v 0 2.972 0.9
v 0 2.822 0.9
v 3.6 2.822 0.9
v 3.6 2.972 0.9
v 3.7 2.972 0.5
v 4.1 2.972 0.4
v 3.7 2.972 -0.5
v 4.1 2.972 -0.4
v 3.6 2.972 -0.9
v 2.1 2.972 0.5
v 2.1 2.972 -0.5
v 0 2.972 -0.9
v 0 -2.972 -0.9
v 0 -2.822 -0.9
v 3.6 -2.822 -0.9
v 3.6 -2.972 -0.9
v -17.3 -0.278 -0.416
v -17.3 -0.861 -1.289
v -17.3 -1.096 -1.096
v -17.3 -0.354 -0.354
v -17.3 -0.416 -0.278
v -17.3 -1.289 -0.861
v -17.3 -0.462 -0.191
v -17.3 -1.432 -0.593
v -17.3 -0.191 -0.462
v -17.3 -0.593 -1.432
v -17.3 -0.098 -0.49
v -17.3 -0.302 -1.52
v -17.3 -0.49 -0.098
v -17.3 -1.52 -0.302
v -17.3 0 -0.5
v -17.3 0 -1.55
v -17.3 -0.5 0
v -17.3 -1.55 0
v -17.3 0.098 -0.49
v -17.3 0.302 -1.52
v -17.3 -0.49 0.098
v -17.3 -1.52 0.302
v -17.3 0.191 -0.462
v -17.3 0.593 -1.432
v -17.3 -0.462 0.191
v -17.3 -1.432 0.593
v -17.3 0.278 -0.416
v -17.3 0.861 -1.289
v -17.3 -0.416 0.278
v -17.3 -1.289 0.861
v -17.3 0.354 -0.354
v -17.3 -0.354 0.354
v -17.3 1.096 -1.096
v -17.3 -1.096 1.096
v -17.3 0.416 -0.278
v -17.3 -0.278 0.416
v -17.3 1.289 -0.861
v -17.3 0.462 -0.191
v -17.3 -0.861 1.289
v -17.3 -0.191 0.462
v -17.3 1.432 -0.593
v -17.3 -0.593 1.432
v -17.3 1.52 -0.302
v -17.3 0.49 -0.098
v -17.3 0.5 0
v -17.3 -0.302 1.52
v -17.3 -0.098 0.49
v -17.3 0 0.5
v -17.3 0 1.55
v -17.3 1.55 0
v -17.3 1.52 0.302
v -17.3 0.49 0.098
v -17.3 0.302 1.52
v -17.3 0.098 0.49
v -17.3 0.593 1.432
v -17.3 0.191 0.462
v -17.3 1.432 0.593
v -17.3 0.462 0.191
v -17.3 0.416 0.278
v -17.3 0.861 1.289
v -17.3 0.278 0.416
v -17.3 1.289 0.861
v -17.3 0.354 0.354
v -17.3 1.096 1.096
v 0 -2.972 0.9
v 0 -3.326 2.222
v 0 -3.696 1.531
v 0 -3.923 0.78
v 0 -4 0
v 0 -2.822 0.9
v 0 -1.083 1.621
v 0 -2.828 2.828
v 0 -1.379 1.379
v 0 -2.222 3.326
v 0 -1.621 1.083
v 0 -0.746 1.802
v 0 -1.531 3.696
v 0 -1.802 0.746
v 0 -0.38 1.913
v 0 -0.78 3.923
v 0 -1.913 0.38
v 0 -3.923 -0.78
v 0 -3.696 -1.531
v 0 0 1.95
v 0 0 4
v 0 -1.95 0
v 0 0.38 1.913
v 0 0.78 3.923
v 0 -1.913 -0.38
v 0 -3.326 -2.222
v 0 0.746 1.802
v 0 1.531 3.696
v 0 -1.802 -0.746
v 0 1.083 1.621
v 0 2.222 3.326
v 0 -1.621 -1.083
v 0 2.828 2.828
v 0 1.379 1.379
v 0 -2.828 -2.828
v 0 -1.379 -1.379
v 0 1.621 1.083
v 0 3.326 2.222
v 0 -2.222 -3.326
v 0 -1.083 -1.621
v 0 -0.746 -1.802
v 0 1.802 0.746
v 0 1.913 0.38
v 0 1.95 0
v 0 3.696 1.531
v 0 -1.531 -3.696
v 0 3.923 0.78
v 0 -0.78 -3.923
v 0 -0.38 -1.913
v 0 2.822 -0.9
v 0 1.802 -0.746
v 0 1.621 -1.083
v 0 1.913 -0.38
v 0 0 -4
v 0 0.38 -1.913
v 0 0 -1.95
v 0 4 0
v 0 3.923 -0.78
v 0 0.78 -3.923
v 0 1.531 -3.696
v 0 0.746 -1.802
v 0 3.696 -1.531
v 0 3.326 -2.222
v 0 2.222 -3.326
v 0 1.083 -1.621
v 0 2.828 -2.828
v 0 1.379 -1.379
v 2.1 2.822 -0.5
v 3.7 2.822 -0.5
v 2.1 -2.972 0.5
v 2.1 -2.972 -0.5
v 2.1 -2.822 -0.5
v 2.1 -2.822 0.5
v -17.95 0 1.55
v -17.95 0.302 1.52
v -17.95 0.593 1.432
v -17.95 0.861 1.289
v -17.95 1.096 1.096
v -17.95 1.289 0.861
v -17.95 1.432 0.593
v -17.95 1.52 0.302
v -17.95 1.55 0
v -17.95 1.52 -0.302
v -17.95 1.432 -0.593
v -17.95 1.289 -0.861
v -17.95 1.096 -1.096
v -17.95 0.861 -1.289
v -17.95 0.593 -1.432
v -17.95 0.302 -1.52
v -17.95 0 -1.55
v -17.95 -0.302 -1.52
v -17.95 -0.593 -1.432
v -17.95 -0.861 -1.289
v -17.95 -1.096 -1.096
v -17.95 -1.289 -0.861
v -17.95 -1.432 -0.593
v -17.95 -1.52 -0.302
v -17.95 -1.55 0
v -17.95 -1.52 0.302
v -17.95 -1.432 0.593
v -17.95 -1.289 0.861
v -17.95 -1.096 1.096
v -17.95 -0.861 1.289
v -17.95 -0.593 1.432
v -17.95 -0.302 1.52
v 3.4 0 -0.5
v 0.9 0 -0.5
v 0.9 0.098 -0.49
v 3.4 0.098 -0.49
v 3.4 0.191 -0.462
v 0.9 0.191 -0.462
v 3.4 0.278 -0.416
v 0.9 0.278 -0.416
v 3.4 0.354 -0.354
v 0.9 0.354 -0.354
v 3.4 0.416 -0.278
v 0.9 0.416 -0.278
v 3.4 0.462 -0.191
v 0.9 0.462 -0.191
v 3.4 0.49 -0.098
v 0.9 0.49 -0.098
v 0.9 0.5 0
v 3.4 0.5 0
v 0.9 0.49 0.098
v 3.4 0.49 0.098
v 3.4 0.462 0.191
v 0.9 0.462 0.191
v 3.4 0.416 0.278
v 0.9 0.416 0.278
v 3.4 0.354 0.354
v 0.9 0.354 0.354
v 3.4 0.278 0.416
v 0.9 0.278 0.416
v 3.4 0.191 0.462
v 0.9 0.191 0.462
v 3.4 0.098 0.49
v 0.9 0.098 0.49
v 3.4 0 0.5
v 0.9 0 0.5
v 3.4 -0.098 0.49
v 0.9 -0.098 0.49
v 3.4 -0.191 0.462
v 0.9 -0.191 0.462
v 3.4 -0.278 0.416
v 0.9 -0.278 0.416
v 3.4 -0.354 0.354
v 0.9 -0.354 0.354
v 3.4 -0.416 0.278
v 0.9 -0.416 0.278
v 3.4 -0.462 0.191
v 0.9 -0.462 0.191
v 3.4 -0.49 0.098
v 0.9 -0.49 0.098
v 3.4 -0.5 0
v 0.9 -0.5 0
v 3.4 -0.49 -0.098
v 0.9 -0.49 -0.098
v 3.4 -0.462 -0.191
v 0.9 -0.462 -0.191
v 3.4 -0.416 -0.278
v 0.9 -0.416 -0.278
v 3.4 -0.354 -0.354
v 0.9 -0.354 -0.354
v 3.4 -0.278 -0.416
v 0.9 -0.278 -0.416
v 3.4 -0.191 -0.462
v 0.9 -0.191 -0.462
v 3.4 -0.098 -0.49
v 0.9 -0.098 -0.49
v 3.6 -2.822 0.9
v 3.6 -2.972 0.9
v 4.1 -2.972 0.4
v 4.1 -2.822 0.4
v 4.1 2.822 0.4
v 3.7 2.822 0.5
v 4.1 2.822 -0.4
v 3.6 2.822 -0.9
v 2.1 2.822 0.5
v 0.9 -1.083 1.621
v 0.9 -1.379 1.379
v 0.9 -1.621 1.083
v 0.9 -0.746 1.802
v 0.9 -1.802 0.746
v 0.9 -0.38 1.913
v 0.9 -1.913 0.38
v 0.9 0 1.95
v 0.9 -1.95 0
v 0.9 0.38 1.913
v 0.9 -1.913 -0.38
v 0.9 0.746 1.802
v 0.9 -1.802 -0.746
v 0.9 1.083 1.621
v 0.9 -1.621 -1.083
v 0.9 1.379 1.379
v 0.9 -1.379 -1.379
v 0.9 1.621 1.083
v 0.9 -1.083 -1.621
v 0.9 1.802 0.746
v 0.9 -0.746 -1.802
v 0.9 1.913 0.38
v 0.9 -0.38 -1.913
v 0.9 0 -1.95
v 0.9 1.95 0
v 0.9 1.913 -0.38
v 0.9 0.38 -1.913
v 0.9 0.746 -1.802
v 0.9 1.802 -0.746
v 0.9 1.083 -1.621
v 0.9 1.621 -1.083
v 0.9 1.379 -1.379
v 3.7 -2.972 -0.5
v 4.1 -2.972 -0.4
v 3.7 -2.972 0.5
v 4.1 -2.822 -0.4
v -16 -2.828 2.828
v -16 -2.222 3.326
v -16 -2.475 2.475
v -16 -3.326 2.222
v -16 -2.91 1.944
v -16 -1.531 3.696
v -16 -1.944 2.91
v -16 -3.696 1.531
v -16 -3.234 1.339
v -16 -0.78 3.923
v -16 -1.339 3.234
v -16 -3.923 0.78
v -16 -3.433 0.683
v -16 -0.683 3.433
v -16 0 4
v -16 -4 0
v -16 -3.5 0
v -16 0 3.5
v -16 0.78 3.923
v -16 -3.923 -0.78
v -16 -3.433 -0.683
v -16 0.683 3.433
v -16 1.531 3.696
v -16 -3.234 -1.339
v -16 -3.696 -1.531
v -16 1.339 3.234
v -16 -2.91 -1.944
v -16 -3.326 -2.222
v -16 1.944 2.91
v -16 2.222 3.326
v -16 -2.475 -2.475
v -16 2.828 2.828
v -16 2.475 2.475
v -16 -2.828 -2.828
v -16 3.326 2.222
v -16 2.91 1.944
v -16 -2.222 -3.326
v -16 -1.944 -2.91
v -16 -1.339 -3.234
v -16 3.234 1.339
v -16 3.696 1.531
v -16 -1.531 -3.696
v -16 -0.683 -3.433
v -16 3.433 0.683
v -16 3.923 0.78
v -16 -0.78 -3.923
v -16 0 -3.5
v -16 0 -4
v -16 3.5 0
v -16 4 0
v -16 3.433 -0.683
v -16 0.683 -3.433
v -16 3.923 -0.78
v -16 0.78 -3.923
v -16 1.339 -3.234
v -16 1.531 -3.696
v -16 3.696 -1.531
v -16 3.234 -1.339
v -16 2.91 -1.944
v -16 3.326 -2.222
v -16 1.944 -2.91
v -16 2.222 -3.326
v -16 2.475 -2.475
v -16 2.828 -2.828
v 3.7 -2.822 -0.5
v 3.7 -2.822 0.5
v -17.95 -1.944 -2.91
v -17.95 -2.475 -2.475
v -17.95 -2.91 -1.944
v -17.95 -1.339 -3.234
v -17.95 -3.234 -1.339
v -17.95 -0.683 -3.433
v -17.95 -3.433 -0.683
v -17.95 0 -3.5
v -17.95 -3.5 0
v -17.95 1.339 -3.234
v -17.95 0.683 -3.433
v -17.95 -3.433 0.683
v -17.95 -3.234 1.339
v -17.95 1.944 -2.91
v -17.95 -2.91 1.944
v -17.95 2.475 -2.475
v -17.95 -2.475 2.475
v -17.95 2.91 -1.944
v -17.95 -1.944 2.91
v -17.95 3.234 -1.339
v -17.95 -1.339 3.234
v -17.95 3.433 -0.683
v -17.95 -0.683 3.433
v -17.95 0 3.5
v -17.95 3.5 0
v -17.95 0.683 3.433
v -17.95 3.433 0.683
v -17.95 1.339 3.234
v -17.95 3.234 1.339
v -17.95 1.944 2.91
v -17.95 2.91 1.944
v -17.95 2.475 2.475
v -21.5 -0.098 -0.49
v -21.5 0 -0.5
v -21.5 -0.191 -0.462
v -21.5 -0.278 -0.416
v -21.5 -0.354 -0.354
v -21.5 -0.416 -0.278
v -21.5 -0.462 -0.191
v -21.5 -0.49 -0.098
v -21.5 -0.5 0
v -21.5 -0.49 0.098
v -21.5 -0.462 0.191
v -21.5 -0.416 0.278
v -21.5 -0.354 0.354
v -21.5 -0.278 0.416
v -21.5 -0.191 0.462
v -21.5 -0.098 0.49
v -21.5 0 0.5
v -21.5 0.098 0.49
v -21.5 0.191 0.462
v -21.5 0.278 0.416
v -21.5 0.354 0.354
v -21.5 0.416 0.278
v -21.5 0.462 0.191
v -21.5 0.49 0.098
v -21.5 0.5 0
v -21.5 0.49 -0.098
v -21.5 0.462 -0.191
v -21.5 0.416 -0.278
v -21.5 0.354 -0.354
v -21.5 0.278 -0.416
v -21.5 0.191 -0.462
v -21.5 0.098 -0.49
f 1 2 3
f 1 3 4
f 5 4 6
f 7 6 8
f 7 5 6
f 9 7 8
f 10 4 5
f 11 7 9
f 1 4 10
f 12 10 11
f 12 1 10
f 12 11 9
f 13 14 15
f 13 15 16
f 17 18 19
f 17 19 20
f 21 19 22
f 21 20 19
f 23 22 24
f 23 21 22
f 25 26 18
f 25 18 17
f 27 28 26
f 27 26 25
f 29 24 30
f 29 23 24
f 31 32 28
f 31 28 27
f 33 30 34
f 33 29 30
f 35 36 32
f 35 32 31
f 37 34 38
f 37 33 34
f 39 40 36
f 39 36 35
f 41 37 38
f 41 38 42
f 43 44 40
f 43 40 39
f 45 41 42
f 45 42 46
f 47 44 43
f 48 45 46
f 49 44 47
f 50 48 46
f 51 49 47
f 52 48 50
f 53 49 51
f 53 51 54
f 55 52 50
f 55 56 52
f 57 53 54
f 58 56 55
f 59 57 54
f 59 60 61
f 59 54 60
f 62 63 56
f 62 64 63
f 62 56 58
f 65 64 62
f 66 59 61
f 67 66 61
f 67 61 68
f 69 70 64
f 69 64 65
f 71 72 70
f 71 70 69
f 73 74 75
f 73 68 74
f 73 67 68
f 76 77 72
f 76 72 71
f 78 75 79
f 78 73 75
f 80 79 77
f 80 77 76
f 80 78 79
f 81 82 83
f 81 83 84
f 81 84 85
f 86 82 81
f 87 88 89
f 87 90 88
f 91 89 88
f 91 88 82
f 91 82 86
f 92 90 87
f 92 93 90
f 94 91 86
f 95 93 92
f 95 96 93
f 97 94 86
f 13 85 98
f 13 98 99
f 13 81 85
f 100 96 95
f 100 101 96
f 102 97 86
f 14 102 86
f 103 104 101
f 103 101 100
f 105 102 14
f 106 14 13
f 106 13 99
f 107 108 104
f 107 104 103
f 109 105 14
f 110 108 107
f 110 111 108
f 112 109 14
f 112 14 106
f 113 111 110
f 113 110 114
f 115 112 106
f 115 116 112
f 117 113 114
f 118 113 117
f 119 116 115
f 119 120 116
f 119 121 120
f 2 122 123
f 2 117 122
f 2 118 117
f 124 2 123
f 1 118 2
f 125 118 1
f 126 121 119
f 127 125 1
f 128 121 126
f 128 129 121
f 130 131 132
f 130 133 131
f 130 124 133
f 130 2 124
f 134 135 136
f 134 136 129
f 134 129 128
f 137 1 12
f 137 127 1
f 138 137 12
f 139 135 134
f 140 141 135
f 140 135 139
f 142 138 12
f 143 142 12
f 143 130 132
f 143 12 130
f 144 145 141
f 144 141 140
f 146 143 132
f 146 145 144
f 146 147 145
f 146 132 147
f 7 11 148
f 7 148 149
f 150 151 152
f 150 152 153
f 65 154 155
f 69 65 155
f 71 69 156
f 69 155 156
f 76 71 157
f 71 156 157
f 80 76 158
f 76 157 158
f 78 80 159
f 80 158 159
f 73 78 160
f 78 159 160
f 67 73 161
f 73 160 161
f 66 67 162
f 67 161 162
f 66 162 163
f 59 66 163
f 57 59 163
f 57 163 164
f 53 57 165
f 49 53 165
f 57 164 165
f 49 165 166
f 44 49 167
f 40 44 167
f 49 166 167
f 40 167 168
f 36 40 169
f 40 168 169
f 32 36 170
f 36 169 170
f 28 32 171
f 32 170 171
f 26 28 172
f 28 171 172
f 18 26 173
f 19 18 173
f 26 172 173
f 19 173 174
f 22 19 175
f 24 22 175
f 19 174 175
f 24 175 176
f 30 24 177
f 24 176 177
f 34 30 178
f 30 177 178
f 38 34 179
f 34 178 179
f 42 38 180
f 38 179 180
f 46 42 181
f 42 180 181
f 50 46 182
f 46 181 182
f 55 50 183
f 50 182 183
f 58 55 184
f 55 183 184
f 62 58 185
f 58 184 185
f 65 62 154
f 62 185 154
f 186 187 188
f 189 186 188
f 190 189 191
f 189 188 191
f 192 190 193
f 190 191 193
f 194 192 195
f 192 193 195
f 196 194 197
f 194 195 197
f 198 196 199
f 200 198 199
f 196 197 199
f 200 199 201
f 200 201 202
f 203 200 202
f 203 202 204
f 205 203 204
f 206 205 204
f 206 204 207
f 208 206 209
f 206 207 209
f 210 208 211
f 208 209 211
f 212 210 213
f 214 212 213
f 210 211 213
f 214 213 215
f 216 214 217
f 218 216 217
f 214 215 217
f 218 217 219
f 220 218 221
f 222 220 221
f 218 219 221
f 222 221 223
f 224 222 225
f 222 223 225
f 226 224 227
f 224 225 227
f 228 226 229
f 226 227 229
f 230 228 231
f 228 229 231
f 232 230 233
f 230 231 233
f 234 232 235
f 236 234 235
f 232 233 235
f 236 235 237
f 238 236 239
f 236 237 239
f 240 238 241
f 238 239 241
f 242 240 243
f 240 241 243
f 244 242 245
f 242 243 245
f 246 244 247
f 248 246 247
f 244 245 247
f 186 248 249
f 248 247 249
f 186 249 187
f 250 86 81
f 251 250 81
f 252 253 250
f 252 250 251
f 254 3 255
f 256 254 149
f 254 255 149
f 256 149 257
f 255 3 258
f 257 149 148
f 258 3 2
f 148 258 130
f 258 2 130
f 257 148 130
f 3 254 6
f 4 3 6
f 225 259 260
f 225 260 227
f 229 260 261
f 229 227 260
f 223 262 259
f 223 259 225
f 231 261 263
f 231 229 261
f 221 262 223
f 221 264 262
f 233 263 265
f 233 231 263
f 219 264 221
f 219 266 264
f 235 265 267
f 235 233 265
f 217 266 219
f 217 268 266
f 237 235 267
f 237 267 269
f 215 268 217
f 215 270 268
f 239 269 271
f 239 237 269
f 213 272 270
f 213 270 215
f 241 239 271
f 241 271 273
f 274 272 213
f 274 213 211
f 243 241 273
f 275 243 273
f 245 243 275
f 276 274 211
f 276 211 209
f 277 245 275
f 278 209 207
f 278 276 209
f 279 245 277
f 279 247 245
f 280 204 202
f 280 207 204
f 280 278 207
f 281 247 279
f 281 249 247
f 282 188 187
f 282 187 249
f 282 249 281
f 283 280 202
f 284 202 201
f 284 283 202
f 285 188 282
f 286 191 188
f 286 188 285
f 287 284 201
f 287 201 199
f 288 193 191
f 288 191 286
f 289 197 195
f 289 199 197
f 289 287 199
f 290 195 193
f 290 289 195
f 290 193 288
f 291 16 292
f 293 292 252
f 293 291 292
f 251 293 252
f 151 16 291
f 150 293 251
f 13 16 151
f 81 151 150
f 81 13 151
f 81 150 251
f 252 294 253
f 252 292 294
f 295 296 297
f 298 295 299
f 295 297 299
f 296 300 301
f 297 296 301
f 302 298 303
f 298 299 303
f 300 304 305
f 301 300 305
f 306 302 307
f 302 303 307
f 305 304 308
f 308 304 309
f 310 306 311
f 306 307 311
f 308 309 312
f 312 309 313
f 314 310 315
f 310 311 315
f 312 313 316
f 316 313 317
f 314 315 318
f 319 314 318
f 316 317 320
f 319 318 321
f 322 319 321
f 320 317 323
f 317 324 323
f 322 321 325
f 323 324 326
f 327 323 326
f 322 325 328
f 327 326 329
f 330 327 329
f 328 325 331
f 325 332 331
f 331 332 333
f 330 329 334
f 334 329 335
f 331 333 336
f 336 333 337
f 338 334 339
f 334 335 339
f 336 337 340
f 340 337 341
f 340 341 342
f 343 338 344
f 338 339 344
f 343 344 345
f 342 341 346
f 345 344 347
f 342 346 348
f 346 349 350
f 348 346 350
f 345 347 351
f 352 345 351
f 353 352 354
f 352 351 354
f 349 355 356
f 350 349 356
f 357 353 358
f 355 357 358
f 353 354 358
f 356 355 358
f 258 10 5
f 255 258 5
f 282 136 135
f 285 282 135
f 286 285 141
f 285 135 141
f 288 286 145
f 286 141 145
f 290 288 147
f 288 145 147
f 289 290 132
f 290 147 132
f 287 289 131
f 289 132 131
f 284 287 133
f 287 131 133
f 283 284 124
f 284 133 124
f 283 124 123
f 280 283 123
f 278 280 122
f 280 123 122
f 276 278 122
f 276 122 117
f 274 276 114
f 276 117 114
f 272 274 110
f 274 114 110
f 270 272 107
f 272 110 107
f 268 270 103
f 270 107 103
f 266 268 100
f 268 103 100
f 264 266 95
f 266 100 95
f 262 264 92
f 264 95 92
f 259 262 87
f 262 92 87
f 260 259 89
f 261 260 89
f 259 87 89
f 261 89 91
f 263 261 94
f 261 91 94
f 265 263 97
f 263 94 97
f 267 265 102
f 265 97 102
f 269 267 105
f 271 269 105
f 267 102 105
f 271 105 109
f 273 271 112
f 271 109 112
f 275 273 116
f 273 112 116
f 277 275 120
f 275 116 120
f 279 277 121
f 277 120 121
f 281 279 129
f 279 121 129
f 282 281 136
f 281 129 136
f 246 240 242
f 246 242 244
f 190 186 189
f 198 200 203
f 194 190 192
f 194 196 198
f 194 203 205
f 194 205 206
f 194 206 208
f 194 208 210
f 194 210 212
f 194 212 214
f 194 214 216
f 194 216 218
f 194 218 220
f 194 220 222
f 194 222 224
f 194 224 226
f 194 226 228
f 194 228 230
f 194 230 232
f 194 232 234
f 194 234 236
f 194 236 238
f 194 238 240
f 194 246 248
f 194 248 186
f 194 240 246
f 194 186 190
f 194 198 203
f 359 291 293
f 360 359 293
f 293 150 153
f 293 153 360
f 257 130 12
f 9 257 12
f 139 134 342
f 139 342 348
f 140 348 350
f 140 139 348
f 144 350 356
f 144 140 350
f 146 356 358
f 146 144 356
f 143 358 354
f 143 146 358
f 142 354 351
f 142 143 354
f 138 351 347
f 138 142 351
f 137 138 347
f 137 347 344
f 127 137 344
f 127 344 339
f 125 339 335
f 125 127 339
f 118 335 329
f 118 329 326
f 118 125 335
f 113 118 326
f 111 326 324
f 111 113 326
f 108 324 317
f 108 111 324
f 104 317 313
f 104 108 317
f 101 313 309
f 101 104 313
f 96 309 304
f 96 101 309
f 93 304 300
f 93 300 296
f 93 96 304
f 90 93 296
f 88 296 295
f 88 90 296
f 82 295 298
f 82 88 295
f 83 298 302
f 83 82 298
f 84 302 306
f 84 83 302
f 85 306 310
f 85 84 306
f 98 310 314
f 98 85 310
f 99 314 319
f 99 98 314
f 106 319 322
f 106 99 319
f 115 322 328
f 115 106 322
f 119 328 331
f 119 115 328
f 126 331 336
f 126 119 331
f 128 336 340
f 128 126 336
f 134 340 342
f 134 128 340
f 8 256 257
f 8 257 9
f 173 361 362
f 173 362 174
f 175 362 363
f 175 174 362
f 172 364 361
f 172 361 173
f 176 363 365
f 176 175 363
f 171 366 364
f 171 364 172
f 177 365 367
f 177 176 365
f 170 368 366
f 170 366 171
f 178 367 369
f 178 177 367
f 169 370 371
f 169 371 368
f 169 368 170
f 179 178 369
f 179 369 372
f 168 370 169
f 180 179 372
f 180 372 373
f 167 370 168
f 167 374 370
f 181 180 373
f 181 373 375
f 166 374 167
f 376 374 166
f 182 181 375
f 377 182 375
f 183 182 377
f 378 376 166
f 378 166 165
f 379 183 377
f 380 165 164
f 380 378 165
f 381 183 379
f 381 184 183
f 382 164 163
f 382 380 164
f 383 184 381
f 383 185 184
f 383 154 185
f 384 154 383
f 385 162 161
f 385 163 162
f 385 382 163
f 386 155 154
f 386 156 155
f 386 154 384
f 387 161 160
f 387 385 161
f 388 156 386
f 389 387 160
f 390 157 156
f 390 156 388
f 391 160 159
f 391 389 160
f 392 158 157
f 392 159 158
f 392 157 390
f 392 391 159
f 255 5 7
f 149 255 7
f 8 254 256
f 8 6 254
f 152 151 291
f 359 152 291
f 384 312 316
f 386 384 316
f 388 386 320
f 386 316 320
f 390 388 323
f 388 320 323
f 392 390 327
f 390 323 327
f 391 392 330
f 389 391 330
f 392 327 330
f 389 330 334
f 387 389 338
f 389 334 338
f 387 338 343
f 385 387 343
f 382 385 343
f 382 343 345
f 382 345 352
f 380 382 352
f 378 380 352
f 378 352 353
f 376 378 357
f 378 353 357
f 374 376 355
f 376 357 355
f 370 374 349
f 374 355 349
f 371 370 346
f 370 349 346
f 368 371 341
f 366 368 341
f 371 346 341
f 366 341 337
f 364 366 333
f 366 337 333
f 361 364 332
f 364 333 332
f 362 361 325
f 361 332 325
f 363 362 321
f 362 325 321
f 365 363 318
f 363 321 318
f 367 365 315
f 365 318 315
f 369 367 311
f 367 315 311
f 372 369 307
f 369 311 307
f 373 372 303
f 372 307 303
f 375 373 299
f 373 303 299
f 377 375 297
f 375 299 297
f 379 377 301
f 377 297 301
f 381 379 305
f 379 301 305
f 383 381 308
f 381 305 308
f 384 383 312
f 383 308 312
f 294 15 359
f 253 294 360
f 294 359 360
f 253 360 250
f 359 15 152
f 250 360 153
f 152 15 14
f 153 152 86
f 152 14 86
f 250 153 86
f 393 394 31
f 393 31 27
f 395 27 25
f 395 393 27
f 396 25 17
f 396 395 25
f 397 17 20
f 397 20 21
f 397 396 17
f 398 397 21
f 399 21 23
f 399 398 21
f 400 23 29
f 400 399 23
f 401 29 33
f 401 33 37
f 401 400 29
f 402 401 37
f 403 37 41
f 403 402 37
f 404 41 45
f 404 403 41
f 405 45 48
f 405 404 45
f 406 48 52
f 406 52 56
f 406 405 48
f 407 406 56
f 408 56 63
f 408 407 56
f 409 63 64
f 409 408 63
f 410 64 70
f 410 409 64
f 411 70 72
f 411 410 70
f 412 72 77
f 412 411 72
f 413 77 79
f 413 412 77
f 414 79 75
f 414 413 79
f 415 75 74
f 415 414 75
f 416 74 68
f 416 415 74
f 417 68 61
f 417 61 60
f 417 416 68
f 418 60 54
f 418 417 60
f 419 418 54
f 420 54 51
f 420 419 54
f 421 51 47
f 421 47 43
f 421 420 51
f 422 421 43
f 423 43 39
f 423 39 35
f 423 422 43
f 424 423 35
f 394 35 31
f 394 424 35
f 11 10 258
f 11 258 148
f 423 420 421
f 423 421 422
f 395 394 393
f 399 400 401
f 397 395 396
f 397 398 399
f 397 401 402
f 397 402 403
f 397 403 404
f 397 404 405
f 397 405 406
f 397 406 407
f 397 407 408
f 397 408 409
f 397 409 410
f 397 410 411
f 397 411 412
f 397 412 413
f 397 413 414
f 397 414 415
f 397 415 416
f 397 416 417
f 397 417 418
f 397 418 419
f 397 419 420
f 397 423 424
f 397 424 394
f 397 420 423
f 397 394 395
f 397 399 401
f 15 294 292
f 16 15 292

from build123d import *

# Parameters (mm, degrees)
ESBO_O1_R                        = 4
RESSALTO_EXTRUS_O1_DEPTH         = 16
ESBO_O2_R                        = 3.5
RESSALTO_EXTRUS_O2_DEPTH         = 1.95
ESBO_O4_R                        = 1.95
RESSALTO_EXTRUS_O4_DEPTH         = 0.9
ESBO_O5_R                        = 0.5
RESSALTO_EXTRUS_O5_DEPTH         = 2.5
ESBO_O6_W                        = 1.8
ESBO_O6_H                        = 0.15
RESSALTO_EXTRUS_O6_DEPTH         = 4.1
CHANFRO1_SIZE                    = 0.5
CORTE_EXTRUS_O1_REACH            = 21.667
ESBO_O7_W                        = 1.6
ESBO_O7_H                        = 1
PADR_OCIRCULAR1_COUNT            = 2
CHANFRO1_OF_PADR_OCIRCULAR1_SIZE = 0.5
ESBO_O3_R                        = 1.55
CORTE_EXTRUS_O2_DEPTH            = 0.65
RESSALTO_EXTRUS_O7_START         = 4.2
ESBO_O9_R                        = 0.5
RESSALTO_EXTRUS_O7_DEPTH         = 4.2


with BuildPart() as part:
    # Esboço1 → Ressalto-extrusão1 (new body)
    with BuildSketch(Plane(origin=(0, 0, 0), x_dir=(0, 0, -1), z_dir=(1, 0, 0))):
        Circle(ESBO_O1_R)
    extrude(amount=-RESSALTO_EXTRUS_O1_DEPTH)

    # Esboço2 → Ressalto-extrusão2 (add)
    with BuildSketch(Plane.ZY.offset(16)):
        Circle(ESBO_O2_R)
    extrude(amount=RESSALTO_EXTRUS_O2_DEPTH)

    # Esboço4 → Ressalto-extrusão4 (add)
    with BuildSketch(Plane(origin=(0, 0, 0), x_dir=(0, 0, -1), z_dir=(1, 0, 0))):
        Circle(ESBO_O4_R)
    extrude(amount=RESSALTO_EXTRUS_O4_DEPTH)

    # Esboço5 → Ressalto-extrusão5 (add)
    with BuildSketch(Plane(origin=(0.9, 0, 0), x_dir=(0, 0, -1), z_dir=(1, 0, 0))):
        Circle(ESBO_O5_R)
    extrude(amount=RESSALTO_EXTRUS_O5_DEPTH)

    # Esboço6 → Ressalto-extrusão6 (add)
    with BuildSketch(Plane(origin=(0, 0, 0), x_dir=(0, 0, -1), z_dir=(1, 0, 0))):
        with Locations((0, 2.896690855)):
            Rectangle(ESBO_O6_W, ESBO_O6_H)
    ressalto_extrus_o6 = extrude(amount=RESSALTO_EXTRUS_O6_DEPTH)

    # Chanfro1
    chanfro1_edges = [part.edges().sort_by_distance(p)[0] for p in [
        (4.1, 2.896690855, 0.9),
        (4.1, 2.896690855, -0.9),
    ]]
    chamfer(chanfro1_edges, length=CHANFRO1_SIZE)

    # Esboço7 → Corte-extrusão1 (cut, up to next)
    with BuildSketch(Plane(origin=(0, 2.971690855, 0), x_dir=(1, 0, 0), z_dir=(0, 1, 0)), mode=Mode.PRIVATE) as corte_extrus_o1_sk1:
        with Locations((2.9, 0)):
            Rectangle(ESBO_O7_W, ESBO_O7_H)
    corte_extrus_o1_tool1 = extrude(corte_extrus_o1_sk1.sketch, amount=-CORTE_EXTRUS_O1_REACH, mode=Mode.PRIVATE) & part.part
    corte_extrus_o1 = corte_extrus_o1_tool1.solids().sort_by_distance((2.9, 2.971691, 0))[0]
    add(corte_extrus_o1, mode=Mode.SUBTRACT)

    # PadrãoCircular1: Ressalto-extrusão6, Corte-extrusão1 ×2 about axis
    padr_ocircular1_axis = Axis((0, 0, 0), (1, 0, 0))
    add([ressalto_extrus_o6.rotate(padr_ocircular1_axis, i * 360 / PADR_OCIRCULAR1_COUNT) for i in range(1, PADR_OCIRCULAR1_COUNT)])
    add([corte_extrus_o1.rotate(padr_ocircular1_axis, i * 360 / PADR_OCIRCULAR1_COUNT) for i in range(1, PADR_OCIRCULAR1_COUNT)], mode=Mode.SUBTRACT)

    # Chanfro1 of PadrãoCircular1
    chanfro1_of_padr_ocircular1_edges = [part.edges().sort_by_distance(p)[0] for p in [
        (4.1, -2.896690855, -0.9),
        (4.1, -2.896690855, 0.9),
    ]]
    chamfer(chanfro1_of_padr_ocircular1_edges, length=CHANFRO1_OF_PADR_OCIRCULAR1_SIZE)

    # Esboço3 → Corte-extrusão2 (cut)
    with BuildSketch(Plane.ZY.offset(17.95)):
        Circle(ESBO_O3_R)
    extrude(amount=-CORTE_EXTRUS_O2_DEPTH, mode=Mode.SUBTRACT)

    # Esboço9 → Ressalto-extrusão7 (add)
    with BuildSketch(Plane.ZY.offset(17.3).offset(RESSALTO_EXTRUS_O7_START)):
        with Locations(Location((0, 0, 0), (0, 0, 180))):
            Circle(ESBO_O9_R)
    extrude(amount=-RESSALTO_EXTRUS_O7_DEPTH)


solid = part.part
